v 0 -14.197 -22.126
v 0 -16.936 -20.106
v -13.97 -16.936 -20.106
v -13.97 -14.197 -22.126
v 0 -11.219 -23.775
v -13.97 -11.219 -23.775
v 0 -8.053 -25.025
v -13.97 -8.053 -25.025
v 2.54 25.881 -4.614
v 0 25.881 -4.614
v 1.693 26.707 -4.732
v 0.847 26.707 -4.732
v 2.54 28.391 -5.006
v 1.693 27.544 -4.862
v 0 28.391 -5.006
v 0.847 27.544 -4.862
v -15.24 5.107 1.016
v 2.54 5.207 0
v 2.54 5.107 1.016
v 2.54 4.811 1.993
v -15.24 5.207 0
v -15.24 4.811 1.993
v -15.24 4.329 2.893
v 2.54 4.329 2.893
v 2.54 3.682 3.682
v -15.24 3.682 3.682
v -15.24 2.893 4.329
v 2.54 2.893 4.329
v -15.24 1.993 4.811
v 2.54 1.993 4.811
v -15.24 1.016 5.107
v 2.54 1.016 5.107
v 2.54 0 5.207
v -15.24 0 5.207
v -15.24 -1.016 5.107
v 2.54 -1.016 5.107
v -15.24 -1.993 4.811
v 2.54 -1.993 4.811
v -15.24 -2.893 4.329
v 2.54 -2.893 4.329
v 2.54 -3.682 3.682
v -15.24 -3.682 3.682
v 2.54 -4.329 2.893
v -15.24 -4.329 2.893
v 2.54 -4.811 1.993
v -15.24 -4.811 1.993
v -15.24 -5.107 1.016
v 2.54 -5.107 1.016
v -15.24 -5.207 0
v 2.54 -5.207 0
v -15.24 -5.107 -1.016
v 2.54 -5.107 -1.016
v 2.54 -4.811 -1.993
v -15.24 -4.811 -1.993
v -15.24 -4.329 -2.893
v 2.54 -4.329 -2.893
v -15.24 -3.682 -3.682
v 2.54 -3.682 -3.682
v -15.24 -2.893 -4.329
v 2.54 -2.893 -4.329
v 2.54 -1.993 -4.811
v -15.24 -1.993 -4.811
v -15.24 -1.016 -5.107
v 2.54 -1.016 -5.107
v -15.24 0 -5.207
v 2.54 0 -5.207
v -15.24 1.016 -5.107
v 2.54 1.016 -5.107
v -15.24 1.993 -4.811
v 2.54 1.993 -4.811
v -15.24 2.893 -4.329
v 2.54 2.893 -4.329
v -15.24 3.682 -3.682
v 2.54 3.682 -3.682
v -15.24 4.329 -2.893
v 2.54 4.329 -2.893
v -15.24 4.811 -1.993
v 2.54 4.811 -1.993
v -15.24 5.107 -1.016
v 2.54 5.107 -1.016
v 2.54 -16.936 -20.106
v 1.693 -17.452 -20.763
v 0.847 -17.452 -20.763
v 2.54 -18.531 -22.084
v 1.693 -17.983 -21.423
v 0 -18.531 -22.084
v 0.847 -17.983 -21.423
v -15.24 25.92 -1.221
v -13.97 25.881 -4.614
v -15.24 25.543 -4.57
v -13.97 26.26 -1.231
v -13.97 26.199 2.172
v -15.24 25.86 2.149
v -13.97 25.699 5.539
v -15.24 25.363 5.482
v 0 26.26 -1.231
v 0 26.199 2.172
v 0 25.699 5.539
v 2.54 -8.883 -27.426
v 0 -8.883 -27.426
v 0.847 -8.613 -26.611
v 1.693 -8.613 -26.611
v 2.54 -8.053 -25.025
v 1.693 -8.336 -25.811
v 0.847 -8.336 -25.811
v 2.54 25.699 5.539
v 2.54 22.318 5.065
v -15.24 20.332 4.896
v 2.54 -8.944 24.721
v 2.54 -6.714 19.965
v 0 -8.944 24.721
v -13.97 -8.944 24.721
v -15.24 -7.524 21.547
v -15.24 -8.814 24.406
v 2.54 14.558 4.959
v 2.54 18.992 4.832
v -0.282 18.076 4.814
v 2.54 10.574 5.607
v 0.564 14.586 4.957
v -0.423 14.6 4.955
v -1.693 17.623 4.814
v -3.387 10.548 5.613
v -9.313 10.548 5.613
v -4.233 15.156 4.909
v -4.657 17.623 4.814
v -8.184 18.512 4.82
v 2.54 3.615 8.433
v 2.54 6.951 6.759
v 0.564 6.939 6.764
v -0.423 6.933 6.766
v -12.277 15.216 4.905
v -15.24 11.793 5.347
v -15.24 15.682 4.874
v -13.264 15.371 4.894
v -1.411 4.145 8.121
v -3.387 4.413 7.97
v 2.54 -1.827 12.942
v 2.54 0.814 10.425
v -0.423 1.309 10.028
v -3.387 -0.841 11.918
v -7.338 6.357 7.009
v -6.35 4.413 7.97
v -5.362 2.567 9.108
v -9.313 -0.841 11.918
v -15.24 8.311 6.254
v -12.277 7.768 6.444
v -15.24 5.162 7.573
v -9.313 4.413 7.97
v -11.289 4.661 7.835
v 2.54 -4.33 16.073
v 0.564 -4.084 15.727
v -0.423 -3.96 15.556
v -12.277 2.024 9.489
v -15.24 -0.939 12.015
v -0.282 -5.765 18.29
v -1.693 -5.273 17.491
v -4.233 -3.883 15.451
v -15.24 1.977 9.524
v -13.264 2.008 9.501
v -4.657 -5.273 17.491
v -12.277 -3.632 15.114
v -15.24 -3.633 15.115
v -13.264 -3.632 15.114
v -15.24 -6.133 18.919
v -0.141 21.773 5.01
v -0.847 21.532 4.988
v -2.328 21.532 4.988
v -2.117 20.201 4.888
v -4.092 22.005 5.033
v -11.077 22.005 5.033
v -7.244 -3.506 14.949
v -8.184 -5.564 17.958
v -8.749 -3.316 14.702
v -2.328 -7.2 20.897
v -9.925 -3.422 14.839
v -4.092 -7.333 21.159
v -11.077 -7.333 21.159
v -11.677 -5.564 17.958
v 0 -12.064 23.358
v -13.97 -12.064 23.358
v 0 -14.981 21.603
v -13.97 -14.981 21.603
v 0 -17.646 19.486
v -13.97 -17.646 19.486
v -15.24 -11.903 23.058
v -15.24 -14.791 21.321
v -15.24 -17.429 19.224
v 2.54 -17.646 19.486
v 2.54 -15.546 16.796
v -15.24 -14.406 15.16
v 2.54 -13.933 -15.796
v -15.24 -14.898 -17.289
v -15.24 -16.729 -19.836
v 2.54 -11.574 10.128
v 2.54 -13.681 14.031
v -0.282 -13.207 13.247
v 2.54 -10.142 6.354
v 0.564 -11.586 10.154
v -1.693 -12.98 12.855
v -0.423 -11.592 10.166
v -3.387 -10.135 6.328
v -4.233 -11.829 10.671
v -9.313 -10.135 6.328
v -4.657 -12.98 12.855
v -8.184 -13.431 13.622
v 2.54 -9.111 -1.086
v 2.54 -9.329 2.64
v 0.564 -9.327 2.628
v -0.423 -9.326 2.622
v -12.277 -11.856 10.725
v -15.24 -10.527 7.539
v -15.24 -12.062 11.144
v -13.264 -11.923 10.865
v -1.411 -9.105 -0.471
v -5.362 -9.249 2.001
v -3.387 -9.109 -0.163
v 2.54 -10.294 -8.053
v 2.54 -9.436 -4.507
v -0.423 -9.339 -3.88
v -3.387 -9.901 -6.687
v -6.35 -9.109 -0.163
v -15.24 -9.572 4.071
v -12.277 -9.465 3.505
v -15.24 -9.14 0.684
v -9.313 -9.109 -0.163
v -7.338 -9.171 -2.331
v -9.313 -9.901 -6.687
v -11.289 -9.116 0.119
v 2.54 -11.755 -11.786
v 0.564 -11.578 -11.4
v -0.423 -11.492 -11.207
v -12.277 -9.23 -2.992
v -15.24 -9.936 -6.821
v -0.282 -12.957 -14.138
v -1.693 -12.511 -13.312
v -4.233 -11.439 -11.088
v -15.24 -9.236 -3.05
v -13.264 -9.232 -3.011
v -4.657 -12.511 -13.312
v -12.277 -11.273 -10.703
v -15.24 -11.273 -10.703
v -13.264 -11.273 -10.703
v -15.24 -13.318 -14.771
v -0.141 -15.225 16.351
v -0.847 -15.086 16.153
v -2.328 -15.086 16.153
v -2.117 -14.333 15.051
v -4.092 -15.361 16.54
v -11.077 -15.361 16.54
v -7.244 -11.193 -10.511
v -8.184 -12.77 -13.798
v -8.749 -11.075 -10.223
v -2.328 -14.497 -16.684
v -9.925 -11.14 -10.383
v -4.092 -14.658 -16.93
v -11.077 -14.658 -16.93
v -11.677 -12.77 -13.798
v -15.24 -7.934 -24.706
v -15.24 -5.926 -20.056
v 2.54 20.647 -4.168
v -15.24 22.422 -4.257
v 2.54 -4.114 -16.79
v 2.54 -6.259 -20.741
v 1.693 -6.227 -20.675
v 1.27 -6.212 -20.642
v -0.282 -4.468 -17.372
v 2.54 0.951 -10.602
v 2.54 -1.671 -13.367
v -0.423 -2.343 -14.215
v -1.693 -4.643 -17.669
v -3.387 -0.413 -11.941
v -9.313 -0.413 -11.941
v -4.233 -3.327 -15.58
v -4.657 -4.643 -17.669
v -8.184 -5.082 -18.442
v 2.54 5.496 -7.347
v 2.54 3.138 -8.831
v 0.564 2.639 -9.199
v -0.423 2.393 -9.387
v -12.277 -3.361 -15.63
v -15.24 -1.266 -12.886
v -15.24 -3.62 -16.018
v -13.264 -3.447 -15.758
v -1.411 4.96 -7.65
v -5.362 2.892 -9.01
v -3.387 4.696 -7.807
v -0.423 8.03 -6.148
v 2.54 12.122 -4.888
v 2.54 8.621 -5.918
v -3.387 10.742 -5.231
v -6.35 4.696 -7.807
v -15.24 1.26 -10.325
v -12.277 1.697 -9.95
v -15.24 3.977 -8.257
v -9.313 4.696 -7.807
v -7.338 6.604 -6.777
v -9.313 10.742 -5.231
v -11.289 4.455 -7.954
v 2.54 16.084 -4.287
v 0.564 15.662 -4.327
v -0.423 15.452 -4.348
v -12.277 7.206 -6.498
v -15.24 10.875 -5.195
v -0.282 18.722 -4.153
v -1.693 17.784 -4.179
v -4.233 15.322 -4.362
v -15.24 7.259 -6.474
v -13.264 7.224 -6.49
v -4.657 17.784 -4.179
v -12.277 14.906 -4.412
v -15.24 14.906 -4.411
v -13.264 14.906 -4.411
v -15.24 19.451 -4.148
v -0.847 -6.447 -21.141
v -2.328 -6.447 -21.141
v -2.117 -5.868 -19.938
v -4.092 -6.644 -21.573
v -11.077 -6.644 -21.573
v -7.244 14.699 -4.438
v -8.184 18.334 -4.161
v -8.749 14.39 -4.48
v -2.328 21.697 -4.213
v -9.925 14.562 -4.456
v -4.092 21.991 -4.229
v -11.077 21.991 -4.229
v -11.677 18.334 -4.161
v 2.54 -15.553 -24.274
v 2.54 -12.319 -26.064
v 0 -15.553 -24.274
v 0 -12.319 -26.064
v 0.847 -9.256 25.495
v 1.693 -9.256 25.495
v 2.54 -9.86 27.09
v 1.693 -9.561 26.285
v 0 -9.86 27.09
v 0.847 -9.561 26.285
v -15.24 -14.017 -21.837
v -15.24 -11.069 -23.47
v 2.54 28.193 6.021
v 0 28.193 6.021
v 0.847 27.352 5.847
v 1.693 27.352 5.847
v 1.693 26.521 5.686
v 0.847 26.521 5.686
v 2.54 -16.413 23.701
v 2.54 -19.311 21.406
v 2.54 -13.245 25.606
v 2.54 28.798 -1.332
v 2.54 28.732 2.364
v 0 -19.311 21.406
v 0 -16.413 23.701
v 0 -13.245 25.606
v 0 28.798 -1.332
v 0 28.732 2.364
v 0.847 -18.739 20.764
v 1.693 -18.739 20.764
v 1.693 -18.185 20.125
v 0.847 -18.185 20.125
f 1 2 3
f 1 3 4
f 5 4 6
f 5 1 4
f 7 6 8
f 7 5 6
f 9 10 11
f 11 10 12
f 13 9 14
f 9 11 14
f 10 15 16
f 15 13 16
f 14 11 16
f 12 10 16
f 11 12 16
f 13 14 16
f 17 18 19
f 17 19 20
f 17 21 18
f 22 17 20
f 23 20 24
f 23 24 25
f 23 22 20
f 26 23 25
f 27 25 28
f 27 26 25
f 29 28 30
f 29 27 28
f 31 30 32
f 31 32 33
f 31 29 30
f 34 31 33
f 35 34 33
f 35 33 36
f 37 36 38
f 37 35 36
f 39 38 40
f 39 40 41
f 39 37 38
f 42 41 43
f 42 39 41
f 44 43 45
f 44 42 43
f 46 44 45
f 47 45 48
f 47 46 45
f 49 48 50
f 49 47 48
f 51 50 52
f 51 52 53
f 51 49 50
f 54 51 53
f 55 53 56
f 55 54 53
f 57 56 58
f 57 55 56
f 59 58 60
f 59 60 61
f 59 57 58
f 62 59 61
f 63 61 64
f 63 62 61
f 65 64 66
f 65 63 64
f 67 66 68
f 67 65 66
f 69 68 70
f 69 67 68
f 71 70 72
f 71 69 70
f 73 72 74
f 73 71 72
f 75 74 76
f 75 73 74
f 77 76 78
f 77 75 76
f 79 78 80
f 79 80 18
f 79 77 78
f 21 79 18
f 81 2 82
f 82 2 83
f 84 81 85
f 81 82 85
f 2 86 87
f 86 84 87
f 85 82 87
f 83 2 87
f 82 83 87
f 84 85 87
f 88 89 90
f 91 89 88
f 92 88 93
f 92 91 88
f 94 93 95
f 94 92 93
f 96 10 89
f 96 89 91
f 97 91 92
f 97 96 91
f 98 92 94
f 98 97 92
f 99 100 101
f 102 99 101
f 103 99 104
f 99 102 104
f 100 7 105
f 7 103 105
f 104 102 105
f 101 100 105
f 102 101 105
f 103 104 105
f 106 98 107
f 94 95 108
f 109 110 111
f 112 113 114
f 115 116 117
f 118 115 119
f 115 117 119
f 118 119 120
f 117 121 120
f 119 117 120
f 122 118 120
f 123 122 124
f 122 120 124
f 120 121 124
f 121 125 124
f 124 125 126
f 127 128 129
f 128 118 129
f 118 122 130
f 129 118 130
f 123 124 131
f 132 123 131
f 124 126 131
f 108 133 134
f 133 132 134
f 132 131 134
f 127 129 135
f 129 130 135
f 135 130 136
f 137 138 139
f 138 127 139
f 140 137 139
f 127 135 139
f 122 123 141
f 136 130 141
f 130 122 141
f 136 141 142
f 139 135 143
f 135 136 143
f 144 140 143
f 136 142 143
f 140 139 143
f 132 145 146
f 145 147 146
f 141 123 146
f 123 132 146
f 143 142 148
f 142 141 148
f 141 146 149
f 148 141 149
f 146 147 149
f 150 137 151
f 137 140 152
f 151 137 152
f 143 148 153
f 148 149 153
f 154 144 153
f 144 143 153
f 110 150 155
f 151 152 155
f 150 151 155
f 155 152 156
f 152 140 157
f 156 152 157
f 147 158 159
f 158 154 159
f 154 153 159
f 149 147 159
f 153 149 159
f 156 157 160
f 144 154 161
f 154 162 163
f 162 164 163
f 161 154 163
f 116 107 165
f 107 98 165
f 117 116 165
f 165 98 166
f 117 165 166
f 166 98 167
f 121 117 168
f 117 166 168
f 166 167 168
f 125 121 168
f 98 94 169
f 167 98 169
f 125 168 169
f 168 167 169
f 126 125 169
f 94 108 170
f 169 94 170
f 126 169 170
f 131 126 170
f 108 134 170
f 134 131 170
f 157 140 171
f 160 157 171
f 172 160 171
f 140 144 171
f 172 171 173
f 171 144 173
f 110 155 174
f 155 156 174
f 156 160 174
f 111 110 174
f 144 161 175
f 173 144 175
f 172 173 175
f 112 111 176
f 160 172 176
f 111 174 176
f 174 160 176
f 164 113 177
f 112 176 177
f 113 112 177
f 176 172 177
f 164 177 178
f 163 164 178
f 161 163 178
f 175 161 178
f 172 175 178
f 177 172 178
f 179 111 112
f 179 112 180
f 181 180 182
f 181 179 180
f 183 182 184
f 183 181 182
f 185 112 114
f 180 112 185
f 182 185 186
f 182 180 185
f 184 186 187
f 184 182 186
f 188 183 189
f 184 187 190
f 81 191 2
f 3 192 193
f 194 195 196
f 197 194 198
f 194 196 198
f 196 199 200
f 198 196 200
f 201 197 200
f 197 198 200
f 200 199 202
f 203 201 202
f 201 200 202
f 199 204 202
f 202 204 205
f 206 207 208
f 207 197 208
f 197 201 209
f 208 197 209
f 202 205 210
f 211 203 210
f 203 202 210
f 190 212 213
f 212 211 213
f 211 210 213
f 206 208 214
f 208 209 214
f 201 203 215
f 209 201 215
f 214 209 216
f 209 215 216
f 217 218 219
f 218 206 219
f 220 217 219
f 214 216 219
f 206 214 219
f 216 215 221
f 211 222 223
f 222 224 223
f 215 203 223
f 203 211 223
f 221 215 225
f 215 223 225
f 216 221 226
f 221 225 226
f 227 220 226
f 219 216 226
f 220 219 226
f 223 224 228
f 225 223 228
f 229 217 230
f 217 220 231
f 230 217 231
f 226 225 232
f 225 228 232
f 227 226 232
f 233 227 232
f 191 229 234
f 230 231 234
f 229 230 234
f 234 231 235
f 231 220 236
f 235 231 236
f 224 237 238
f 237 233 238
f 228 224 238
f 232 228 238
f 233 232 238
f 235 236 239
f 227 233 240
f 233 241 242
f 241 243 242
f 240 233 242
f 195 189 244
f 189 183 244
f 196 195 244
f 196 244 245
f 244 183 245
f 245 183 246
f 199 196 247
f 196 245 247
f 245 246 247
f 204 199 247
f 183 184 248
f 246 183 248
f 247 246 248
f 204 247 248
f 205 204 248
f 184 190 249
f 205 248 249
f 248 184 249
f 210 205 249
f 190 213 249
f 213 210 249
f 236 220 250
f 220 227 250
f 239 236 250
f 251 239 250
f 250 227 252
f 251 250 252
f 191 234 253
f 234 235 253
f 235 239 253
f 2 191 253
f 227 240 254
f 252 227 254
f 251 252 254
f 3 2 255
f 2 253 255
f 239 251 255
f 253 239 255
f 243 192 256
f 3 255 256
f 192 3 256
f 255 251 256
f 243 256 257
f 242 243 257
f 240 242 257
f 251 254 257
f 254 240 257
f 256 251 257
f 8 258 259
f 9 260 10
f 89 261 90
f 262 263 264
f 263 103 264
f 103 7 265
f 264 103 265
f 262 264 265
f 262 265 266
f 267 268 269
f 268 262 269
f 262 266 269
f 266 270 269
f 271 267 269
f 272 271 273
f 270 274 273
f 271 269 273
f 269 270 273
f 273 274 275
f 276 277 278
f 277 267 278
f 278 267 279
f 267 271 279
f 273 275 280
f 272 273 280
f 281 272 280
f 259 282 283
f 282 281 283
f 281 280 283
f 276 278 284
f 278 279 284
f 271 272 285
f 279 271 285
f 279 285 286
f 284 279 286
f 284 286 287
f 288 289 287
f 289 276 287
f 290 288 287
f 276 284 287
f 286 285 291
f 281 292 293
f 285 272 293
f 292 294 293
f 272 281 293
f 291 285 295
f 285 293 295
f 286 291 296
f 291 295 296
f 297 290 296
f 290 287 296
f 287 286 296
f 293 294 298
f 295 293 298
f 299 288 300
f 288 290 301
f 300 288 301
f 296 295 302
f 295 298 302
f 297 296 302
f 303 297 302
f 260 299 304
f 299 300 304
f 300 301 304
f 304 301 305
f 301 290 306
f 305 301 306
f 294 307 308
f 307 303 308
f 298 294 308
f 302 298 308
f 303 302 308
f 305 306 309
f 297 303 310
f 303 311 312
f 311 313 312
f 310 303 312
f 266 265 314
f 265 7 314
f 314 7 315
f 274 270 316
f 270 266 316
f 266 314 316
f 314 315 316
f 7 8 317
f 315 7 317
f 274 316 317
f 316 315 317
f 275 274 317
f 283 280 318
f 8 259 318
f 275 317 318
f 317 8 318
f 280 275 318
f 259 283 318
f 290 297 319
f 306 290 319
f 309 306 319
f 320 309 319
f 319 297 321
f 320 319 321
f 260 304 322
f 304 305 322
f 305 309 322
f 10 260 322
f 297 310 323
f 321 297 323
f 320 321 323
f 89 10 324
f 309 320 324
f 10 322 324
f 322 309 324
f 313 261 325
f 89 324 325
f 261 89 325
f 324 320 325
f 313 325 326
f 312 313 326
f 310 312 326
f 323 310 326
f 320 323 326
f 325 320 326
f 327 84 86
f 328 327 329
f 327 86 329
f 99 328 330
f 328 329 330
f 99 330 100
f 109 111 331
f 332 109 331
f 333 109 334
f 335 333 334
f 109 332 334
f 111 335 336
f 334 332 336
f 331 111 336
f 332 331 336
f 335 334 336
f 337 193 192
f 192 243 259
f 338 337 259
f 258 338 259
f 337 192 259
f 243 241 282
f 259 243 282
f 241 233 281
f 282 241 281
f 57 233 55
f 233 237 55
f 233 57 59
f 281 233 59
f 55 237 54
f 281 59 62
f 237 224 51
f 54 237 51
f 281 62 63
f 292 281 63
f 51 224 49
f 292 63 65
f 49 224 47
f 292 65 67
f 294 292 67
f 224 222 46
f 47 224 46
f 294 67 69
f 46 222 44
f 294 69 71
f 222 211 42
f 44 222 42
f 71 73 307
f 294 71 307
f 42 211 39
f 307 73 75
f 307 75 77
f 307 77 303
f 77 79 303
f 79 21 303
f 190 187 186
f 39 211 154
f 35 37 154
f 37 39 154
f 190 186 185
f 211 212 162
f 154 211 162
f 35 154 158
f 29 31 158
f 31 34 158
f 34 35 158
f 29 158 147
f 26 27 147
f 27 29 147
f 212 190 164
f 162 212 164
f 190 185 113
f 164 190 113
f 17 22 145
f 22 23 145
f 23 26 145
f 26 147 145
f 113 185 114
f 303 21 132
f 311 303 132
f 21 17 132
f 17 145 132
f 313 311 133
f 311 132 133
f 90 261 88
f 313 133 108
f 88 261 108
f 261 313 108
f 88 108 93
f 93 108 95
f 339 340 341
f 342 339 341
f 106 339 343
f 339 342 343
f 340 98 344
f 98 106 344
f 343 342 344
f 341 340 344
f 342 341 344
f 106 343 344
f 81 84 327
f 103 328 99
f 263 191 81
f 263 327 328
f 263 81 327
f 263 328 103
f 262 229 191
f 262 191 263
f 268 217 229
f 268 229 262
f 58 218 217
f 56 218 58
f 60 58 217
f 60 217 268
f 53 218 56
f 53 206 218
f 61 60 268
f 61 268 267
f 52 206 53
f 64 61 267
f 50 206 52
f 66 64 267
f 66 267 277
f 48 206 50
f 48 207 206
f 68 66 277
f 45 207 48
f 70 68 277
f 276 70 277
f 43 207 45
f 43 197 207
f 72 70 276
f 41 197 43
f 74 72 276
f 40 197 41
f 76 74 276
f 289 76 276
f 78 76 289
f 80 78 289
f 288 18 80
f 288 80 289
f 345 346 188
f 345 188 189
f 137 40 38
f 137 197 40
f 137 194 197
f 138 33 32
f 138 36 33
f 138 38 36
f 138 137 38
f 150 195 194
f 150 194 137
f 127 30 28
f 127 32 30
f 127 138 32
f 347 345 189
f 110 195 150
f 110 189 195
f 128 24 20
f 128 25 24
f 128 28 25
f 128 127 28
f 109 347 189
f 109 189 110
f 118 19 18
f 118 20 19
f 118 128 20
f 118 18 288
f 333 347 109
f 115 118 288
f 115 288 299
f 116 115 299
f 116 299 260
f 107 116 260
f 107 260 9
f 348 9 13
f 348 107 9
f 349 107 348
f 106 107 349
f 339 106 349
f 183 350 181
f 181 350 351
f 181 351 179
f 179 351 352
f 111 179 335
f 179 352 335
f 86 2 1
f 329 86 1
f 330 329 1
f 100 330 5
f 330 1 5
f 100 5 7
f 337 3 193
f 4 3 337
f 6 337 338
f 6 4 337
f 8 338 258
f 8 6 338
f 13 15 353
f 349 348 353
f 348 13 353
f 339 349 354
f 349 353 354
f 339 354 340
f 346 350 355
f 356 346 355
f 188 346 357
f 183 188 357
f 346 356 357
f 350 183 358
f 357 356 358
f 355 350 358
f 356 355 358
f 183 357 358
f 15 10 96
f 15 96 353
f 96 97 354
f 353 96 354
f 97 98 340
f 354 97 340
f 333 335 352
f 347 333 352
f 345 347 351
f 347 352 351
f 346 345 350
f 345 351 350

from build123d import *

# Parameters (mm, degrees)
F0_R     = 26.289
F0_R_2   = 5.207
F1_DEPTH = 15.24
F2_R     = 28.829
F2_R_2   = 5.207
F3_DEPTH = 2.54
F5_DEPTH = 17.781
F6_COUNT = 3
F6_ANGLE = 240
F8_SIZE2 = 1.27
F8_SIZE  = 0.3402954744


with BuildPart() as f1:
    # F0 (on Right) → F1 (new body)
    with BuildSketch(Plane.YZ):
        Circle(F0_R)
        Circle(F0_R_2, mode=Mode.SUBTRACT)
    extrude(amount=-F1_DEPTH)

    # F2 (on face) → F3 (join)
    with BuildSketch(Plane.YZ):
        Circle(F2_R)
        Circle(F2_R_2, mode=Mode.SUBTRACT)
    extrude(amount=F3_DEPTH)


with BuildPart() as f5:
    # F4 (on face) → F5 (new body, through all)
    with BuildSketch(Plane(origin=(-15.24, 0, 0), x_dir=(0, -1, 0), z_dir=(-1, 0, 0))):
        with BuildLine():
            ThreePointArc((-28.3910227116, -5.006103314), (-23.5858740231, -39.2113912621), (8.8826653964, -27.4264379104))
            add(Edge.make_bspline(
                [(8.8826653964, -27.4264379104), (8.6161177773, -26.6034358722), (8.3394760096, -25.8031213114), (8.0525136679, -25.025358032)],
                knots=[0, 0, 0, 0, 1.8877220202, 1.8877220202, 1.8877220202, 1.8877220202], degree=3))
            ThreePointArc((8.0525136679, -25.025358032), (-13.5505111701, -22.527653407), (-25.8808899077, -4.6142235084))
            add(Edge.make_bspline(
                [(-25.8808899077, -4.6142235084), (-26.7024403228, -4.7252100836), (-27.5390757823, -4.8558820842), (-28.3910227116, -5.006103314)],
                knots=[41.6093954543, 41.6093954543, 41.6093954543, 41.6093954543, 43.4971174745, 43.4971174745, 43.4971174745, 43.4971174745], degree=3))
        make_face()
        with BuildLine():
            ThreePointArc((-25.8808899077, -4.6142235084), (-13.5505111701, -22.527653407), (8.0525136679, -25.025358032))
            add(Edge.make_bspline(
                [(8.0525136679, -25.025358032), (2.0142176142, -8.6595697091), (-8.5937274184, -2.2788306654), (-25.8808899077, -4.6142235084)],
                knots=[1.8877220202, 1.8877220202, 1.8877220202, 1.8877220202, 41.6093954543, 41.6093954543, 41.6093954543, 41.6093954543], degree=3))
        make_face()
    extrude(amount=-F5_DEPTH)


with BuildPart() as f6_1:
    # F6: instance of F5
    add(f5.part.rotate(Axis((0, 0, 0), (1, 0, 0)), 1 * F6_ANGLE / (F6_COUNT - 1)))


with BuildPart() as f6_2:
    # F6: instance of F5
    add(f5.part.rotate(Axis((0, 0, 0), (1, 0, 0)), 2 * F6_ANGLE / (F6_COUNT - 1)))


with BuildPart() as f1_1:
    add(f1.part)

    # F7: cut F5, F6_2, F6_1
    add(f5.part, mode=Mode.SUBTRACT)
    add(f6_2.part, mode=Mode.SUBTRACT)
    add(f6_1.part, mode=Mode.SUBTRACT)

    # F8
    f8_edges = [f1_1.edges().sort_by_distance(p)[0] for p in [
        (-15.24, 26.284776, 0.47126),
        (-15.24, -13.550511, 22.527653),
        (-15.24, -12.734265, -22.998914),
    ]]
    f8_side = f1_1.faces().sort_by_distance((-15.24, 4.091505, 7.389523))[0]
    chamfer(f8_edges, length=F8_SIZE, length2=F8_SIZE2, reference=f8_side)


solid = f1_1.part
